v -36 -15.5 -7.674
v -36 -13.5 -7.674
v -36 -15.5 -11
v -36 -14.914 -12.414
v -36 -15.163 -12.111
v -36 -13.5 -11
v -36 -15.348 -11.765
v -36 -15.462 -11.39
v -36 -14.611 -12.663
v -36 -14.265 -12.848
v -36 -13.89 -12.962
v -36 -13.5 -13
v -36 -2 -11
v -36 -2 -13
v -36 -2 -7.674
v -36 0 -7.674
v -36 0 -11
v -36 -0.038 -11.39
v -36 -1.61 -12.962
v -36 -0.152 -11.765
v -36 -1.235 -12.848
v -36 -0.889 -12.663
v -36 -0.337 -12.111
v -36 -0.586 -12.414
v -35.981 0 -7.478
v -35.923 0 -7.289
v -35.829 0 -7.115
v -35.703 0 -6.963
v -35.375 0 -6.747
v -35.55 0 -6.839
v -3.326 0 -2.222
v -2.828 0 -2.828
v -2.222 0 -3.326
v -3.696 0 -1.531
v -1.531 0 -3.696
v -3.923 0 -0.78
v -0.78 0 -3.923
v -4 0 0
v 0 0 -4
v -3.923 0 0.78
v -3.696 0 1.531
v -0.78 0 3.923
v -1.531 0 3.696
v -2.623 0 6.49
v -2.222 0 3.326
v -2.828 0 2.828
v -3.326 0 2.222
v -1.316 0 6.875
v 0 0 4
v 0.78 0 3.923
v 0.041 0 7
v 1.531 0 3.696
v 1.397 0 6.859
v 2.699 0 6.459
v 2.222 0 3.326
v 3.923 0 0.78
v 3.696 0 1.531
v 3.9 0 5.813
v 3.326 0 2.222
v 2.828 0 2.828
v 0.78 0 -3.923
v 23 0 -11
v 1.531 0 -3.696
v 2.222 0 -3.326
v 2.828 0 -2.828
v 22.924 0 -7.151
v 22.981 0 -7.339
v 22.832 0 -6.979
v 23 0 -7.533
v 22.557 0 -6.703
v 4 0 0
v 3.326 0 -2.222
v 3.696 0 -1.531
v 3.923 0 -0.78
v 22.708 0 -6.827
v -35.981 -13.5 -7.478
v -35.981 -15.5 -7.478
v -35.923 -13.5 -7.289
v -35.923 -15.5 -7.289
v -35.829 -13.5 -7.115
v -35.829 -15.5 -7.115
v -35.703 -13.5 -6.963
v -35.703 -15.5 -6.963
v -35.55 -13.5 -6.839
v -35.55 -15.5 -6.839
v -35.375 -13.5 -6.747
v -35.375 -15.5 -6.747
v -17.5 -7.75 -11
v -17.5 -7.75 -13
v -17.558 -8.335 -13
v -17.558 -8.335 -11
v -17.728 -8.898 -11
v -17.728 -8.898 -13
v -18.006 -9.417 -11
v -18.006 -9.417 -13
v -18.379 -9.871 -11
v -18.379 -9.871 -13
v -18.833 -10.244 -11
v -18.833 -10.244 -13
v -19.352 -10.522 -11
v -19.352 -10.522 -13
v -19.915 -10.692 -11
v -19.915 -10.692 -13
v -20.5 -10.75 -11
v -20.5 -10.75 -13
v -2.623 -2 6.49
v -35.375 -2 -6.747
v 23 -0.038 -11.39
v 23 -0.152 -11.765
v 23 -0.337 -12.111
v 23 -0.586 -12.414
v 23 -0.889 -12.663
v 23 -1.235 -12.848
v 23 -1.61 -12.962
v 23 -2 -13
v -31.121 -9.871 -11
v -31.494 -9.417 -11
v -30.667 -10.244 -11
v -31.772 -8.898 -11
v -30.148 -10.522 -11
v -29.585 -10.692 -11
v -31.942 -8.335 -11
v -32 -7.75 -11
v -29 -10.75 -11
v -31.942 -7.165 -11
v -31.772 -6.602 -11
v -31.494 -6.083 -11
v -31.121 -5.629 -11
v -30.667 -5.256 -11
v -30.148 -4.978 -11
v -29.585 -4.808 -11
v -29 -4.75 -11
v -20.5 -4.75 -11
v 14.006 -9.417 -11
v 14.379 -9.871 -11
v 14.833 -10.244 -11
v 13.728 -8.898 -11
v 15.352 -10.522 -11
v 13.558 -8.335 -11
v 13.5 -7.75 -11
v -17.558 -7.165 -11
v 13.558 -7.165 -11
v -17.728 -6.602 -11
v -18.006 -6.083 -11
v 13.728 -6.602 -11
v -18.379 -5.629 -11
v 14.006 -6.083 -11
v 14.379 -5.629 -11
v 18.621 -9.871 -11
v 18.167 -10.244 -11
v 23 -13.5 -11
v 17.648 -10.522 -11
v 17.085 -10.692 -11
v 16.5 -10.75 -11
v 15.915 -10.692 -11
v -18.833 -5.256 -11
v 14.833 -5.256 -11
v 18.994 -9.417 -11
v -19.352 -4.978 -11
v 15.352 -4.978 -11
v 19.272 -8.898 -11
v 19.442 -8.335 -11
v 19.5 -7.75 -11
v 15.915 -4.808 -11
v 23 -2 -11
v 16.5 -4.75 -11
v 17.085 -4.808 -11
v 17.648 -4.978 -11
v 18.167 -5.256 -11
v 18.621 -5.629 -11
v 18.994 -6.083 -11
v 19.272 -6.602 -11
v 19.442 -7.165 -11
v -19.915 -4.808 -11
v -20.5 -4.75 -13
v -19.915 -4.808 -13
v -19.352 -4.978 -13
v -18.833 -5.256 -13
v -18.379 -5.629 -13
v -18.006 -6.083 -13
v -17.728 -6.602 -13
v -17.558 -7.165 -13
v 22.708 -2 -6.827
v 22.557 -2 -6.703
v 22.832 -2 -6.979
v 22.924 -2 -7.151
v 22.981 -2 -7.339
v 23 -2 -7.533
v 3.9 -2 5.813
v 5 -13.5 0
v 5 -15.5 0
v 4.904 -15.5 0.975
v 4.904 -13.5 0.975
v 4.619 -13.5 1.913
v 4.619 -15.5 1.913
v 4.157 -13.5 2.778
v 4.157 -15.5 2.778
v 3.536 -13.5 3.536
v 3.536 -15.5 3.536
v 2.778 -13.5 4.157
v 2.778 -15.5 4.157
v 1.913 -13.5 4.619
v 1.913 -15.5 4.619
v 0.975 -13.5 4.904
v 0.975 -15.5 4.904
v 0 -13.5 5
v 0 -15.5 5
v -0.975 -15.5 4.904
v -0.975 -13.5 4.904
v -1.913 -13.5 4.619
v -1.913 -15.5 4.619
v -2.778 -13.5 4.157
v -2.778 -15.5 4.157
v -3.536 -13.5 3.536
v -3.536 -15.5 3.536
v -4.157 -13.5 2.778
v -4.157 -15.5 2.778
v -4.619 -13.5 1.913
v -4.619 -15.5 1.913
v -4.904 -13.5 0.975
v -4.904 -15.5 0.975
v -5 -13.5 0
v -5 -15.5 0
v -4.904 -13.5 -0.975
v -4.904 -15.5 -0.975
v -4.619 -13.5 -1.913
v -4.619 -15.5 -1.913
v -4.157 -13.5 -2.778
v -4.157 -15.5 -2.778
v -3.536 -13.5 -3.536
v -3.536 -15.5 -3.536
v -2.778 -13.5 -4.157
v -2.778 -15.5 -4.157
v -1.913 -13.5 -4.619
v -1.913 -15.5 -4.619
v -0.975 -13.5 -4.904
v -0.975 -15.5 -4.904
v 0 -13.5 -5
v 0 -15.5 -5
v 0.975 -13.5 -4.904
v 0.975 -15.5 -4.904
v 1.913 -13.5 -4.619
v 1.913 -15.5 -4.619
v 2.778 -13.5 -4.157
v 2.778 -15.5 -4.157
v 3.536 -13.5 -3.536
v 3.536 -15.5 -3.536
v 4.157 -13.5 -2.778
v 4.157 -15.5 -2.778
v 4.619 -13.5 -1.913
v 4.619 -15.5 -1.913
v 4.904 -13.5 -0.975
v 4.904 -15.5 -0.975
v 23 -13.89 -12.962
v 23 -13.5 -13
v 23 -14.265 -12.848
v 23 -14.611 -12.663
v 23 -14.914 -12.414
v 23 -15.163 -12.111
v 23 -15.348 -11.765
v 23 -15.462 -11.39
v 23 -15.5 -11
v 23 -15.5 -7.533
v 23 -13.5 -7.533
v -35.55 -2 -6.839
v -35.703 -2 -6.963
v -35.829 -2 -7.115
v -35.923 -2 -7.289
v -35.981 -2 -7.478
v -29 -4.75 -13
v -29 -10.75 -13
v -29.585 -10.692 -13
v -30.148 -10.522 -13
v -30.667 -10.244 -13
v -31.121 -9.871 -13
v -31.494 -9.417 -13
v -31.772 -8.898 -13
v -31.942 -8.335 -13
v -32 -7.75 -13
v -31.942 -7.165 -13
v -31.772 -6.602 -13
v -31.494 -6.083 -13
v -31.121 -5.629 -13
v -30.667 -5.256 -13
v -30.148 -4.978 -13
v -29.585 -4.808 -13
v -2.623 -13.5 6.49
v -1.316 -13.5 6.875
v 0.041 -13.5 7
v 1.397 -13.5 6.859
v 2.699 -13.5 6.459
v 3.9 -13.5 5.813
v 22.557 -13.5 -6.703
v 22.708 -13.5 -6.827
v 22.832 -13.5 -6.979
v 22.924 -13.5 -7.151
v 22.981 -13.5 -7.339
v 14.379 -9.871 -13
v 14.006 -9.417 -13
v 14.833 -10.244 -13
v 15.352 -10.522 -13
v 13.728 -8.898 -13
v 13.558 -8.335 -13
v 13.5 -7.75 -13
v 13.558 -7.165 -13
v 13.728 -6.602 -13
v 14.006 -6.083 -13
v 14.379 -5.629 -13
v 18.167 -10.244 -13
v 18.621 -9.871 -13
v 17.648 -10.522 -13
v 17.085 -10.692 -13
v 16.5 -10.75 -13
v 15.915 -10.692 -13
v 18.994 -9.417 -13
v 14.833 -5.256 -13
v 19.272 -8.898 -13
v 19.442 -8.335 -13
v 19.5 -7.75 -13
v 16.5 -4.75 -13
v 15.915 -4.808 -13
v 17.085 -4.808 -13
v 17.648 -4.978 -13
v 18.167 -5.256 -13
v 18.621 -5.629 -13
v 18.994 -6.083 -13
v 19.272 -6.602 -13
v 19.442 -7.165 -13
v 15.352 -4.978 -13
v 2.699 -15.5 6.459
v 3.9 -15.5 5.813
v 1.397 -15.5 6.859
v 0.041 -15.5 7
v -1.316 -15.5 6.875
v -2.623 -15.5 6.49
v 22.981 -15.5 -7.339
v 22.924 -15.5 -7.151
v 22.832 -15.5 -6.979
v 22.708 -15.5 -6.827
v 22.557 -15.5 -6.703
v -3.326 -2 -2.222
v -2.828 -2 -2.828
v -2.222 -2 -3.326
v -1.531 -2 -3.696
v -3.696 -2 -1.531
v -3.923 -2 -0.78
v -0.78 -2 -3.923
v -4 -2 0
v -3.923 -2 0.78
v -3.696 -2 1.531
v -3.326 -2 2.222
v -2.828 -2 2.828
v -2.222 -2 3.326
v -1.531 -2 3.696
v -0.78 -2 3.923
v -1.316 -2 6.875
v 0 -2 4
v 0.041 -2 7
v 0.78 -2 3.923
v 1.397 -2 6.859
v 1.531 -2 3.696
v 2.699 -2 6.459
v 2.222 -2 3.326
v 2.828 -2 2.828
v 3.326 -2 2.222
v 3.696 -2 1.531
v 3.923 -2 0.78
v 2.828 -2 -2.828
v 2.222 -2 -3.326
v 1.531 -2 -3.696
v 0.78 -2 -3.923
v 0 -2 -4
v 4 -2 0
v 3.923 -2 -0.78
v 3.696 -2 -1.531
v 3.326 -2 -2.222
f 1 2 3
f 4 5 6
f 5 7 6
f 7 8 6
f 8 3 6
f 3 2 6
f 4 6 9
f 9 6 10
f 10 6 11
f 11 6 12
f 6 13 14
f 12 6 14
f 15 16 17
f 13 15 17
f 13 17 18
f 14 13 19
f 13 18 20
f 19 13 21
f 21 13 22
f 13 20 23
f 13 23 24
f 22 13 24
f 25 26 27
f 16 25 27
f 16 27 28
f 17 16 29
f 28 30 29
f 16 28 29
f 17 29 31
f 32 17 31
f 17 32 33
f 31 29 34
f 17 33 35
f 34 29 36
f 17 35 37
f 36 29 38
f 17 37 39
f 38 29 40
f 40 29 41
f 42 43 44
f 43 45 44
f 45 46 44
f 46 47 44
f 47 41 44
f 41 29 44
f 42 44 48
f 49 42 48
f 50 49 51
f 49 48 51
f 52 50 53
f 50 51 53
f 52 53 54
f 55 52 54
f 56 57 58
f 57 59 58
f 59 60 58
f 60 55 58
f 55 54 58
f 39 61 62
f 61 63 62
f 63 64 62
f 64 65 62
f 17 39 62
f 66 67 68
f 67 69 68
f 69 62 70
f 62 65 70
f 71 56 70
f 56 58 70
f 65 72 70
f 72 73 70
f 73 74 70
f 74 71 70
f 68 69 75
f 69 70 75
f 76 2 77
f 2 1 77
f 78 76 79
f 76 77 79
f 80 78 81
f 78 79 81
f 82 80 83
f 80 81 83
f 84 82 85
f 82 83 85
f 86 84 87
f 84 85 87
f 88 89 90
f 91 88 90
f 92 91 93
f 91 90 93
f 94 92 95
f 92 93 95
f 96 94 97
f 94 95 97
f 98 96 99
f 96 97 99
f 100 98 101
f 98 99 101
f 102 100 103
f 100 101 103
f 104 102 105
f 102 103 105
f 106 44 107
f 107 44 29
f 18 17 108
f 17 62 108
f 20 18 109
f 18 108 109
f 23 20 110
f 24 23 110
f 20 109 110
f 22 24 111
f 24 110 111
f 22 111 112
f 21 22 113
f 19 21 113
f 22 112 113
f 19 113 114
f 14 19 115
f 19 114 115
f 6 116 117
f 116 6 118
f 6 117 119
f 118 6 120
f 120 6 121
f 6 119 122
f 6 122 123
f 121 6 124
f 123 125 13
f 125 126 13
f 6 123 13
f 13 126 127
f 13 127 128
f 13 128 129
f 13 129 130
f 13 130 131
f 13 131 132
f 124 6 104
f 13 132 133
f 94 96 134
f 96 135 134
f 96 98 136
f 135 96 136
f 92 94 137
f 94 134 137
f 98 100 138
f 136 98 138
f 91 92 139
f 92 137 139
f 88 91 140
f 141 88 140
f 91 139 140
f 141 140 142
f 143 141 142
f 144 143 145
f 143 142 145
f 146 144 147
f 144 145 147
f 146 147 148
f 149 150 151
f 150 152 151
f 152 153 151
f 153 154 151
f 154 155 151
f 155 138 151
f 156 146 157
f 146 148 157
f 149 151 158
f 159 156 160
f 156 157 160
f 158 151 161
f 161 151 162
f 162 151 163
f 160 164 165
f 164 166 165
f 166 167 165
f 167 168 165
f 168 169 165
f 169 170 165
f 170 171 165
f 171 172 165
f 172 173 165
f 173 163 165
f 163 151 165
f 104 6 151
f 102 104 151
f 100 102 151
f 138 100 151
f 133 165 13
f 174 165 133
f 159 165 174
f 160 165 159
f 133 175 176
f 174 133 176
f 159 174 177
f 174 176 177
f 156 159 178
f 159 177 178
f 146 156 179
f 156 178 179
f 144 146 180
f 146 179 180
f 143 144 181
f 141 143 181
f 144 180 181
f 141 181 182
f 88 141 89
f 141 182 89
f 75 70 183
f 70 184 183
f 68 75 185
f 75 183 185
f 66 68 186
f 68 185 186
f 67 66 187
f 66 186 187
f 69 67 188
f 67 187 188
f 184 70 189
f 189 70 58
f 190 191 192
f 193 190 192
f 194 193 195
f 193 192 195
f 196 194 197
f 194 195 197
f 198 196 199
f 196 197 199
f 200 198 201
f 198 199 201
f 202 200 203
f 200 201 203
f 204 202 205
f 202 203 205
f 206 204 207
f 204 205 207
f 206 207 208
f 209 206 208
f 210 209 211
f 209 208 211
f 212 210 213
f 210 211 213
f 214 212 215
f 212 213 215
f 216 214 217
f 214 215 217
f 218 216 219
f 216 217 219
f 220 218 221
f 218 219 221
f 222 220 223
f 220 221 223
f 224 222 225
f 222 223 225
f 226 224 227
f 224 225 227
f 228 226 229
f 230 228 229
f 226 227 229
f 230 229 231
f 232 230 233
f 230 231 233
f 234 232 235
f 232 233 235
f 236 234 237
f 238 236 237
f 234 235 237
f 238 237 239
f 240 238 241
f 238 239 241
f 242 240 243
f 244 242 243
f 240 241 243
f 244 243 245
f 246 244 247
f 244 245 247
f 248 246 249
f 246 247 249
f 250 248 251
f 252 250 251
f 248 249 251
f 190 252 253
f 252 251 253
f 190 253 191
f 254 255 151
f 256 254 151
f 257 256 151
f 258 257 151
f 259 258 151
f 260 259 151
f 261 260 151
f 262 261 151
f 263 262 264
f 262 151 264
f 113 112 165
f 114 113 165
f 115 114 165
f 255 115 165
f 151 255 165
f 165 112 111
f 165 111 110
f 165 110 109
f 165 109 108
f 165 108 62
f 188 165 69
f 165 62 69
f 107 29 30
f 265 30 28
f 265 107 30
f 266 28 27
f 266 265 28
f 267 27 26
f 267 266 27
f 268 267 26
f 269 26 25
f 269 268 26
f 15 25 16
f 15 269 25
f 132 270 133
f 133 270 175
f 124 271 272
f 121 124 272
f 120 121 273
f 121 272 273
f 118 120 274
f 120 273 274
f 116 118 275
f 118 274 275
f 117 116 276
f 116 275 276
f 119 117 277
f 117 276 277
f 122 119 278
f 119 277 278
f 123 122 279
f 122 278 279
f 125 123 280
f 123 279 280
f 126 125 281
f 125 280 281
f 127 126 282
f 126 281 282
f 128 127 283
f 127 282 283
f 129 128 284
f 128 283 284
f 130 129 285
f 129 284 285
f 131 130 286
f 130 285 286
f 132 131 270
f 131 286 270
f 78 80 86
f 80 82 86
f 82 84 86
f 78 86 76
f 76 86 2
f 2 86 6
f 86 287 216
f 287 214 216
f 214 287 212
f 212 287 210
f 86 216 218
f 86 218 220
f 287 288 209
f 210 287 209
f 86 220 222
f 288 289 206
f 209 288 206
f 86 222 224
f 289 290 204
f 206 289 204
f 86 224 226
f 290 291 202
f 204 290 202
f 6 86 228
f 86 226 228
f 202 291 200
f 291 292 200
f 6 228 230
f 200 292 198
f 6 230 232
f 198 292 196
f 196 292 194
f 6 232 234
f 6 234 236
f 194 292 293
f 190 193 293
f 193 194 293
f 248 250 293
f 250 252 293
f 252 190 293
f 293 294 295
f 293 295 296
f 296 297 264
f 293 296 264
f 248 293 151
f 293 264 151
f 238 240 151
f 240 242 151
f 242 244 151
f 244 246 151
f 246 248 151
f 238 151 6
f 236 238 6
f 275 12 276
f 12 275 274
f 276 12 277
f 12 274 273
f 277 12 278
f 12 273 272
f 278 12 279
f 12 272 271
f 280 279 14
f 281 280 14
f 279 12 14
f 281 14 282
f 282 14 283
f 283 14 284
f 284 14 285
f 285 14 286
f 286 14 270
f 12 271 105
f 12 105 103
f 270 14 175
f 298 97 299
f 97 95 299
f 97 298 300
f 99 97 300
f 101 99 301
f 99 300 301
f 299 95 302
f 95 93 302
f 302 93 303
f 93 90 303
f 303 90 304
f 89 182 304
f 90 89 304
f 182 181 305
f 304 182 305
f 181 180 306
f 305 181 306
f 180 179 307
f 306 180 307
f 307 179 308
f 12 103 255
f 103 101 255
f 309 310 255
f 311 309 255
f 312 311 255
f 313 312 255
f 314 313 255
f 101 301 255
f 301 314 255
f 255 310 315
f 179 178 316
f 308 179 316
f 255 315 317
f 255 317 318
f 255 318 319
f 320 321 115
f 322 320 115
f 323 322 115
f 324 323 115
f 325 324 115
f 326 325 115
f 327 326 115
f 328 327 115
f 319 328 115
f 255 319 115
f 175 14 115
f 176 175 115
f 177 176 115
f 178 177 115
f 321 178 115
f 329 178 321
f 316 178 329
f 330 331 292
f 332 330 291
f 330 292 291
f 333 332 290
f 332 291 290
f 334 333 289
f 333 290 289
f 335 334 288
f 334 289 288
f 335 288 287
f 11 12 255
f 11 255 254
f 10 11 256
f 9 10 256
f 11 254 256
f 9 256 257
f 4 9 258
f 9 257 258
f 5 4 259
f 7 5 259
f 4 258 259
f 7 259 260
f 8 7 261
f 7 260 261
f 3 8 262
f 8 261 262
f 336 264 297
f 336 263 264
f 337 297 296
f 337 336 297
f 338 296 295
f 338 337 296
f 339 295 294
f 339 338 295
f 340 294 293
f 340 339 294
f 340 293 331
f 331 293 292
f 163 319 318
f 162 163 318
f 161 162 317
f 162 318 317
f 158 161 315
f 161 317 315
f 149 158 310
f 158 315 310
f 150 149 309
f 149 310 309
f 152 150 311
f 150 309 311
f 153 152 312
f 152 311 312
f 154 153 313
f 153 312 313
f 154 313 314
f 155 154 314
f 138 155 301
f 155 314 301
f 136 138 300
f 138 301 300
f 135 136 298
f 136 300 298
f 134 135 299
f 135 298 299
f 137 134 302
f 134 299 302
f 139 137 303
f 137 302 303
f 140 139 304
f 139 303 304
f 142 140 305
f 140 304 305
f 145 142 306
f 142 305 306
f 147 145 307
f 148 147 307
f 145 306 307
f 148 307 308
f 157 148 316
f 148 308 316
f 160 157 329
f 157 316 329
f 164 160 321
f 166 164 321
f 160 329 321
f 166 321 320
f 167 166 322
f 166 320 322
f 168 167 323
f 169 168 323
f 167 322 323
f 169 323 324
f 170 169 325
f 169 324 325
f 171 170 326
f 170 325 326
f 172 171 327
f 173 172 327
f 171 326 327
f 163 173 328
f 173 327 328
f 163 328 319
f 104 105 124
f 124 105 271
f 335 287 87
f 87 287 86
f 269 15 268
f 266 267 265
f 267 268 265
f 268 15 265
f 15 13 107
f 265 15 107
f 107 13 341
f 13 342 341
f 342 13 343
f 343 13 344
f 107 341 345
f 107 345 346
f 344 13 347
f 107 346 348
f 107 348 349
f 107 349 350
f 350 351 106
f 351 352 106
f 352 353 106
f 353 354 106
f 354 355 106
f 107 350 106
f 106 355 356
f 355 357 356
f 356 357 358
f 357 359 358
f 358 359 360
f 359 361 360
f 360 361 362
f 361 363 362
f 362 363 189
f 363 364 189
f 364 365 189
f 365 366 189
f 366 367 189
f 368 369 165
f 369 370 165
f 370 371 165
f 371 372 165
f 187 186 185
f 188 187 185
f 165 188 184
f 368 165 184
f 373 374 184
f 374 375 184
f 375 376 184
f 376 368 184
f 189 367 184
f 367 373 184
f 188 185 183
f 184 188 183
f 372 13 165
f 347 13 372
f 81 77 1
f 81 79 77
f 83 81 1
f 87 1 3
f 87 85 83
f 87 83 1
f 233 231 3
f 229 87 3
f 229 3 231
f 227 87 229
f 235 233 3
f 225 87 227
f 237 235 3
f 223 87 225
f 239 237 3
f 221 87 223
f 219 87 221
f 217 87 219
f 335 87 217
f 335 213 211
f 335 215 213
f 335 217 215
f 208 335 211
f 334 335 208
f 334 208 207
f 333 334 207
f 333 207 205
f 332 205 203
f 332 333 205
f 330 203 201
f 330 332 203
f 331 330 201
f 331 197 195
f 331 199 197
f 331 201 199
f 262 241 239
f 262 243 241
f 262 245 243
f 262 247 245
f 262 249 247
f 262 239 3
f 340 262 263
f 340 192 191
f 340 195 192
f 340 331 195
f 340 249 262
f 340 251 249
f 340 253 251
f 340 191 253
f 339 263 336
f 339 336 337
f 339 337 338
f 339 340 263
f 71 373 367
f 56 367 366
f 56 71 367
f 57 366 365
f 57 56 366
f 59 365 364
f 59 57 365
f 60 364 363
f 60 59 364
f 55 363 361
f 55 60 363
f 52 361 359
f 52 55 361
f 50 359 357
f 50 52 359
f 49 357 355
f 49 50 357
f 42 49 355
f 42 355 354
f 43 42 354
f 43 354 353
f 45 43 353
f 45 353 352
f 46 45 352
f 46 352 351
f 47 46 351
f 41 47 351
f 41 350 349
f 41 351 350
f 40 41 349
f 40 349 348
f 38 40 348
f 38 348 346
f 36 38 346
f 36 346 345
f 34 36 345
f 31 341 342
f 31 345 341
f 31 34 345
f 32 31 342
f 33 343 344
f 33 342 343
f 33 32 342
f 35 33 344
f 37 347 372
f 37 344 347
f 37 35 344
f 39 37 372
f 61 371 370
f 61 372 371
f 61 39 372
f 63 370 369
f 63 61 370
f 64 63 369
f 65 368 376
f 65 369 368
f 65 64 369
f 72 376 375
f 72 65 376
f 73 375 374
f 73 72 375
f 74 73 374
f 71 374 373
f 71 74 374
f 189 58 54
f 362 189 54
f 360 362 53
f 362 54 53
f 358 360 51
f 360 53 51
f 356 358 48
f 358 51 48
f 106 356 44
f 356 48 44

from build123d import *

# Parameters (mm, degrees)
F0_R     = 5
F0_R_2   = 4
F1_DEPTH = 15.5
F2_W     = 11.5
F2_H     = 26.2481089791
F2_H_2   = 4
F3_DEPTH = 59.001
F4_R     = 3
F5_DEPTH = 2
F6_R     = 1
F7_R     = 2
F8_R     = 5
F8_R_2   = 4
F9_DEPTH = 2


# Not quite as in the source:
# - a feature names something its author has since deleted; it is built from what else it names


with BuildPart() as f1:
    # F0 (on Front) → F1 (new body)
    with BuildSketch(Plane.XZ):
        with BuildLine():
            Line((-36, -7), (-4.54e-08, -7))
            ThreePointArc((-4.54e-08, -7), (-6.871307732, -1.3360875914), (-2.6230483271, 6.4899628253))
            Line((-2.6230483271, 6.4899628253), (-36, -7))
        make_face()
        Polygon((23, -7), (-4.54e-08, -7), (-36, -7), (-36, -13), (23, -13), align=None)
        with BuildLine():
            ThreePointArc((3.8996539792, 5.8131487889), (6.1764705882, 3.2941176471), (7, 0))
            ThreePointArc((7, 0), (4.9497474522, -4.9497474844), (-4.54e-08, -7))
            Line((-4.54e-08, -7), (23, -7))
            Line((23, -7), (3.8996539792, 5.8131487889))
        make_face()
        with BuildLine():
            ThreePointArc((-4.54e-08, -7), (4.9497474522, -4.9497474844), (7, 0))
            ThreePointArc((7, 0), (6.1764705882, 3.2941176471), (3.8996539792, 5.8131487889))
            ThreePointArc((3.8996539792, 5.8131487889), (0.7224609385, 6.9626180559), (-2.6230483271, 6.4899628253))
            ThreePointArc((-2.6230483271, 6.4899628253), (-6.871307732, -1.3360875914), (-4.54e-08, -7))
        make_face()
        Circle(F0_R, mode=Mode.SUBTRACT)
        Circle(F0_R)
        Circle(F0_R_2, mode=Mode.SUBTRACT)
    extrude(amount=F1_DEPTH)

    # F2 (on face) → F3 (cut, through all)
    with BuildSketch(Plane.YZ.offset(23)):
        with Locations((-7.75, 6.1240544895)):
            Rectangle(F2_W, F2_H)
        with Locations((-7.75, -9)):
            Rectangle(F2_W, F2_H_2)
    extrude(amount=-F3_DEPTH, mode=Mode.SUBTRACT)

    # F4 (on face) → F5 (cut)
    with BuildSketch(Plane(origin=(0, 0, -13), x_dir=(1, 0, 0), z_dir=(0, 0, -1))):
        with BuildLine():
            ThreePointArc((-29, 4.75), (-26.8786796564, 5.6286796564), (-26, 7.75))
            ThreePointArc((-26, 7.75), (-26.8786796564, 9.8713203436), (-29, 10.75))
            ThreePointArc((-29, 10.75), (-32, 7.75), (-29, 4.75))
        make_face()
        with BuildLine():
            ThreePointArc((-29, 10.75), (-26.8786796564, 9.8713203436), (-26, 7.75))
            ThreePointArc((-26, 7.75), (-26.8786796564, 5.6286796564), (-29, 4.75))
            Line((-29, 4.75), (-20.5, 4.75))
            ThreePointArc((-20.5, 4.75), (-23.5, 7.75), (-20.5, 10.75))
            Line((-20.5, 10.75), (-29, 10.75))
        make_face()
        with BuildLine():
            ThreePointArc((-17.5, 7.75), (-18.3786796564, 9.8713203436), (-20.5, 10.75))
            ThreePointArc((-20.5, 10.75), (-23.5, 7.75), (-20.5, 4.75))
            ThreePointArc((-20.5, 4.75), (-18.3786796564, 5.6286796564), (-17.5, 7.75))
        make_face()
        with Locations((16.5, 7.75)):
            Circle(F4_R)
    extrude(amount=-F5_DEPTH, mode=Mode.SUBTRACT)

    # F6
    f6_edges = [f1.edges().sort_by_distance(p)[0] for p in [
        (-36, -14.5, -7),
        (-36, -1, -7),
        (23, -14.5, -7),
        (23, -1, -7),
    ]]
    fillet(f6_edges, radius=F6_R)

    # F7
    f7_edges = [f1.edges().sort_by_distance(p)[0] for p in [
        (-6.5, -15.5, -13),
        (-6.5, 0, -13),
    ]]
    fillet(f7_edges, radius=F7_R)

    # F8 (on face) → F9 (cut, through all)
    with BuildSketch(Plane.XZ.offset(15.5)):
        Circle(F8_R)
        Circle(F8_R_2, mode=Mode.SUBTRACT)
    extrude(amount=-F9_DEPTH, mode=Mode.SUBTRACT)


solid = f1.part
